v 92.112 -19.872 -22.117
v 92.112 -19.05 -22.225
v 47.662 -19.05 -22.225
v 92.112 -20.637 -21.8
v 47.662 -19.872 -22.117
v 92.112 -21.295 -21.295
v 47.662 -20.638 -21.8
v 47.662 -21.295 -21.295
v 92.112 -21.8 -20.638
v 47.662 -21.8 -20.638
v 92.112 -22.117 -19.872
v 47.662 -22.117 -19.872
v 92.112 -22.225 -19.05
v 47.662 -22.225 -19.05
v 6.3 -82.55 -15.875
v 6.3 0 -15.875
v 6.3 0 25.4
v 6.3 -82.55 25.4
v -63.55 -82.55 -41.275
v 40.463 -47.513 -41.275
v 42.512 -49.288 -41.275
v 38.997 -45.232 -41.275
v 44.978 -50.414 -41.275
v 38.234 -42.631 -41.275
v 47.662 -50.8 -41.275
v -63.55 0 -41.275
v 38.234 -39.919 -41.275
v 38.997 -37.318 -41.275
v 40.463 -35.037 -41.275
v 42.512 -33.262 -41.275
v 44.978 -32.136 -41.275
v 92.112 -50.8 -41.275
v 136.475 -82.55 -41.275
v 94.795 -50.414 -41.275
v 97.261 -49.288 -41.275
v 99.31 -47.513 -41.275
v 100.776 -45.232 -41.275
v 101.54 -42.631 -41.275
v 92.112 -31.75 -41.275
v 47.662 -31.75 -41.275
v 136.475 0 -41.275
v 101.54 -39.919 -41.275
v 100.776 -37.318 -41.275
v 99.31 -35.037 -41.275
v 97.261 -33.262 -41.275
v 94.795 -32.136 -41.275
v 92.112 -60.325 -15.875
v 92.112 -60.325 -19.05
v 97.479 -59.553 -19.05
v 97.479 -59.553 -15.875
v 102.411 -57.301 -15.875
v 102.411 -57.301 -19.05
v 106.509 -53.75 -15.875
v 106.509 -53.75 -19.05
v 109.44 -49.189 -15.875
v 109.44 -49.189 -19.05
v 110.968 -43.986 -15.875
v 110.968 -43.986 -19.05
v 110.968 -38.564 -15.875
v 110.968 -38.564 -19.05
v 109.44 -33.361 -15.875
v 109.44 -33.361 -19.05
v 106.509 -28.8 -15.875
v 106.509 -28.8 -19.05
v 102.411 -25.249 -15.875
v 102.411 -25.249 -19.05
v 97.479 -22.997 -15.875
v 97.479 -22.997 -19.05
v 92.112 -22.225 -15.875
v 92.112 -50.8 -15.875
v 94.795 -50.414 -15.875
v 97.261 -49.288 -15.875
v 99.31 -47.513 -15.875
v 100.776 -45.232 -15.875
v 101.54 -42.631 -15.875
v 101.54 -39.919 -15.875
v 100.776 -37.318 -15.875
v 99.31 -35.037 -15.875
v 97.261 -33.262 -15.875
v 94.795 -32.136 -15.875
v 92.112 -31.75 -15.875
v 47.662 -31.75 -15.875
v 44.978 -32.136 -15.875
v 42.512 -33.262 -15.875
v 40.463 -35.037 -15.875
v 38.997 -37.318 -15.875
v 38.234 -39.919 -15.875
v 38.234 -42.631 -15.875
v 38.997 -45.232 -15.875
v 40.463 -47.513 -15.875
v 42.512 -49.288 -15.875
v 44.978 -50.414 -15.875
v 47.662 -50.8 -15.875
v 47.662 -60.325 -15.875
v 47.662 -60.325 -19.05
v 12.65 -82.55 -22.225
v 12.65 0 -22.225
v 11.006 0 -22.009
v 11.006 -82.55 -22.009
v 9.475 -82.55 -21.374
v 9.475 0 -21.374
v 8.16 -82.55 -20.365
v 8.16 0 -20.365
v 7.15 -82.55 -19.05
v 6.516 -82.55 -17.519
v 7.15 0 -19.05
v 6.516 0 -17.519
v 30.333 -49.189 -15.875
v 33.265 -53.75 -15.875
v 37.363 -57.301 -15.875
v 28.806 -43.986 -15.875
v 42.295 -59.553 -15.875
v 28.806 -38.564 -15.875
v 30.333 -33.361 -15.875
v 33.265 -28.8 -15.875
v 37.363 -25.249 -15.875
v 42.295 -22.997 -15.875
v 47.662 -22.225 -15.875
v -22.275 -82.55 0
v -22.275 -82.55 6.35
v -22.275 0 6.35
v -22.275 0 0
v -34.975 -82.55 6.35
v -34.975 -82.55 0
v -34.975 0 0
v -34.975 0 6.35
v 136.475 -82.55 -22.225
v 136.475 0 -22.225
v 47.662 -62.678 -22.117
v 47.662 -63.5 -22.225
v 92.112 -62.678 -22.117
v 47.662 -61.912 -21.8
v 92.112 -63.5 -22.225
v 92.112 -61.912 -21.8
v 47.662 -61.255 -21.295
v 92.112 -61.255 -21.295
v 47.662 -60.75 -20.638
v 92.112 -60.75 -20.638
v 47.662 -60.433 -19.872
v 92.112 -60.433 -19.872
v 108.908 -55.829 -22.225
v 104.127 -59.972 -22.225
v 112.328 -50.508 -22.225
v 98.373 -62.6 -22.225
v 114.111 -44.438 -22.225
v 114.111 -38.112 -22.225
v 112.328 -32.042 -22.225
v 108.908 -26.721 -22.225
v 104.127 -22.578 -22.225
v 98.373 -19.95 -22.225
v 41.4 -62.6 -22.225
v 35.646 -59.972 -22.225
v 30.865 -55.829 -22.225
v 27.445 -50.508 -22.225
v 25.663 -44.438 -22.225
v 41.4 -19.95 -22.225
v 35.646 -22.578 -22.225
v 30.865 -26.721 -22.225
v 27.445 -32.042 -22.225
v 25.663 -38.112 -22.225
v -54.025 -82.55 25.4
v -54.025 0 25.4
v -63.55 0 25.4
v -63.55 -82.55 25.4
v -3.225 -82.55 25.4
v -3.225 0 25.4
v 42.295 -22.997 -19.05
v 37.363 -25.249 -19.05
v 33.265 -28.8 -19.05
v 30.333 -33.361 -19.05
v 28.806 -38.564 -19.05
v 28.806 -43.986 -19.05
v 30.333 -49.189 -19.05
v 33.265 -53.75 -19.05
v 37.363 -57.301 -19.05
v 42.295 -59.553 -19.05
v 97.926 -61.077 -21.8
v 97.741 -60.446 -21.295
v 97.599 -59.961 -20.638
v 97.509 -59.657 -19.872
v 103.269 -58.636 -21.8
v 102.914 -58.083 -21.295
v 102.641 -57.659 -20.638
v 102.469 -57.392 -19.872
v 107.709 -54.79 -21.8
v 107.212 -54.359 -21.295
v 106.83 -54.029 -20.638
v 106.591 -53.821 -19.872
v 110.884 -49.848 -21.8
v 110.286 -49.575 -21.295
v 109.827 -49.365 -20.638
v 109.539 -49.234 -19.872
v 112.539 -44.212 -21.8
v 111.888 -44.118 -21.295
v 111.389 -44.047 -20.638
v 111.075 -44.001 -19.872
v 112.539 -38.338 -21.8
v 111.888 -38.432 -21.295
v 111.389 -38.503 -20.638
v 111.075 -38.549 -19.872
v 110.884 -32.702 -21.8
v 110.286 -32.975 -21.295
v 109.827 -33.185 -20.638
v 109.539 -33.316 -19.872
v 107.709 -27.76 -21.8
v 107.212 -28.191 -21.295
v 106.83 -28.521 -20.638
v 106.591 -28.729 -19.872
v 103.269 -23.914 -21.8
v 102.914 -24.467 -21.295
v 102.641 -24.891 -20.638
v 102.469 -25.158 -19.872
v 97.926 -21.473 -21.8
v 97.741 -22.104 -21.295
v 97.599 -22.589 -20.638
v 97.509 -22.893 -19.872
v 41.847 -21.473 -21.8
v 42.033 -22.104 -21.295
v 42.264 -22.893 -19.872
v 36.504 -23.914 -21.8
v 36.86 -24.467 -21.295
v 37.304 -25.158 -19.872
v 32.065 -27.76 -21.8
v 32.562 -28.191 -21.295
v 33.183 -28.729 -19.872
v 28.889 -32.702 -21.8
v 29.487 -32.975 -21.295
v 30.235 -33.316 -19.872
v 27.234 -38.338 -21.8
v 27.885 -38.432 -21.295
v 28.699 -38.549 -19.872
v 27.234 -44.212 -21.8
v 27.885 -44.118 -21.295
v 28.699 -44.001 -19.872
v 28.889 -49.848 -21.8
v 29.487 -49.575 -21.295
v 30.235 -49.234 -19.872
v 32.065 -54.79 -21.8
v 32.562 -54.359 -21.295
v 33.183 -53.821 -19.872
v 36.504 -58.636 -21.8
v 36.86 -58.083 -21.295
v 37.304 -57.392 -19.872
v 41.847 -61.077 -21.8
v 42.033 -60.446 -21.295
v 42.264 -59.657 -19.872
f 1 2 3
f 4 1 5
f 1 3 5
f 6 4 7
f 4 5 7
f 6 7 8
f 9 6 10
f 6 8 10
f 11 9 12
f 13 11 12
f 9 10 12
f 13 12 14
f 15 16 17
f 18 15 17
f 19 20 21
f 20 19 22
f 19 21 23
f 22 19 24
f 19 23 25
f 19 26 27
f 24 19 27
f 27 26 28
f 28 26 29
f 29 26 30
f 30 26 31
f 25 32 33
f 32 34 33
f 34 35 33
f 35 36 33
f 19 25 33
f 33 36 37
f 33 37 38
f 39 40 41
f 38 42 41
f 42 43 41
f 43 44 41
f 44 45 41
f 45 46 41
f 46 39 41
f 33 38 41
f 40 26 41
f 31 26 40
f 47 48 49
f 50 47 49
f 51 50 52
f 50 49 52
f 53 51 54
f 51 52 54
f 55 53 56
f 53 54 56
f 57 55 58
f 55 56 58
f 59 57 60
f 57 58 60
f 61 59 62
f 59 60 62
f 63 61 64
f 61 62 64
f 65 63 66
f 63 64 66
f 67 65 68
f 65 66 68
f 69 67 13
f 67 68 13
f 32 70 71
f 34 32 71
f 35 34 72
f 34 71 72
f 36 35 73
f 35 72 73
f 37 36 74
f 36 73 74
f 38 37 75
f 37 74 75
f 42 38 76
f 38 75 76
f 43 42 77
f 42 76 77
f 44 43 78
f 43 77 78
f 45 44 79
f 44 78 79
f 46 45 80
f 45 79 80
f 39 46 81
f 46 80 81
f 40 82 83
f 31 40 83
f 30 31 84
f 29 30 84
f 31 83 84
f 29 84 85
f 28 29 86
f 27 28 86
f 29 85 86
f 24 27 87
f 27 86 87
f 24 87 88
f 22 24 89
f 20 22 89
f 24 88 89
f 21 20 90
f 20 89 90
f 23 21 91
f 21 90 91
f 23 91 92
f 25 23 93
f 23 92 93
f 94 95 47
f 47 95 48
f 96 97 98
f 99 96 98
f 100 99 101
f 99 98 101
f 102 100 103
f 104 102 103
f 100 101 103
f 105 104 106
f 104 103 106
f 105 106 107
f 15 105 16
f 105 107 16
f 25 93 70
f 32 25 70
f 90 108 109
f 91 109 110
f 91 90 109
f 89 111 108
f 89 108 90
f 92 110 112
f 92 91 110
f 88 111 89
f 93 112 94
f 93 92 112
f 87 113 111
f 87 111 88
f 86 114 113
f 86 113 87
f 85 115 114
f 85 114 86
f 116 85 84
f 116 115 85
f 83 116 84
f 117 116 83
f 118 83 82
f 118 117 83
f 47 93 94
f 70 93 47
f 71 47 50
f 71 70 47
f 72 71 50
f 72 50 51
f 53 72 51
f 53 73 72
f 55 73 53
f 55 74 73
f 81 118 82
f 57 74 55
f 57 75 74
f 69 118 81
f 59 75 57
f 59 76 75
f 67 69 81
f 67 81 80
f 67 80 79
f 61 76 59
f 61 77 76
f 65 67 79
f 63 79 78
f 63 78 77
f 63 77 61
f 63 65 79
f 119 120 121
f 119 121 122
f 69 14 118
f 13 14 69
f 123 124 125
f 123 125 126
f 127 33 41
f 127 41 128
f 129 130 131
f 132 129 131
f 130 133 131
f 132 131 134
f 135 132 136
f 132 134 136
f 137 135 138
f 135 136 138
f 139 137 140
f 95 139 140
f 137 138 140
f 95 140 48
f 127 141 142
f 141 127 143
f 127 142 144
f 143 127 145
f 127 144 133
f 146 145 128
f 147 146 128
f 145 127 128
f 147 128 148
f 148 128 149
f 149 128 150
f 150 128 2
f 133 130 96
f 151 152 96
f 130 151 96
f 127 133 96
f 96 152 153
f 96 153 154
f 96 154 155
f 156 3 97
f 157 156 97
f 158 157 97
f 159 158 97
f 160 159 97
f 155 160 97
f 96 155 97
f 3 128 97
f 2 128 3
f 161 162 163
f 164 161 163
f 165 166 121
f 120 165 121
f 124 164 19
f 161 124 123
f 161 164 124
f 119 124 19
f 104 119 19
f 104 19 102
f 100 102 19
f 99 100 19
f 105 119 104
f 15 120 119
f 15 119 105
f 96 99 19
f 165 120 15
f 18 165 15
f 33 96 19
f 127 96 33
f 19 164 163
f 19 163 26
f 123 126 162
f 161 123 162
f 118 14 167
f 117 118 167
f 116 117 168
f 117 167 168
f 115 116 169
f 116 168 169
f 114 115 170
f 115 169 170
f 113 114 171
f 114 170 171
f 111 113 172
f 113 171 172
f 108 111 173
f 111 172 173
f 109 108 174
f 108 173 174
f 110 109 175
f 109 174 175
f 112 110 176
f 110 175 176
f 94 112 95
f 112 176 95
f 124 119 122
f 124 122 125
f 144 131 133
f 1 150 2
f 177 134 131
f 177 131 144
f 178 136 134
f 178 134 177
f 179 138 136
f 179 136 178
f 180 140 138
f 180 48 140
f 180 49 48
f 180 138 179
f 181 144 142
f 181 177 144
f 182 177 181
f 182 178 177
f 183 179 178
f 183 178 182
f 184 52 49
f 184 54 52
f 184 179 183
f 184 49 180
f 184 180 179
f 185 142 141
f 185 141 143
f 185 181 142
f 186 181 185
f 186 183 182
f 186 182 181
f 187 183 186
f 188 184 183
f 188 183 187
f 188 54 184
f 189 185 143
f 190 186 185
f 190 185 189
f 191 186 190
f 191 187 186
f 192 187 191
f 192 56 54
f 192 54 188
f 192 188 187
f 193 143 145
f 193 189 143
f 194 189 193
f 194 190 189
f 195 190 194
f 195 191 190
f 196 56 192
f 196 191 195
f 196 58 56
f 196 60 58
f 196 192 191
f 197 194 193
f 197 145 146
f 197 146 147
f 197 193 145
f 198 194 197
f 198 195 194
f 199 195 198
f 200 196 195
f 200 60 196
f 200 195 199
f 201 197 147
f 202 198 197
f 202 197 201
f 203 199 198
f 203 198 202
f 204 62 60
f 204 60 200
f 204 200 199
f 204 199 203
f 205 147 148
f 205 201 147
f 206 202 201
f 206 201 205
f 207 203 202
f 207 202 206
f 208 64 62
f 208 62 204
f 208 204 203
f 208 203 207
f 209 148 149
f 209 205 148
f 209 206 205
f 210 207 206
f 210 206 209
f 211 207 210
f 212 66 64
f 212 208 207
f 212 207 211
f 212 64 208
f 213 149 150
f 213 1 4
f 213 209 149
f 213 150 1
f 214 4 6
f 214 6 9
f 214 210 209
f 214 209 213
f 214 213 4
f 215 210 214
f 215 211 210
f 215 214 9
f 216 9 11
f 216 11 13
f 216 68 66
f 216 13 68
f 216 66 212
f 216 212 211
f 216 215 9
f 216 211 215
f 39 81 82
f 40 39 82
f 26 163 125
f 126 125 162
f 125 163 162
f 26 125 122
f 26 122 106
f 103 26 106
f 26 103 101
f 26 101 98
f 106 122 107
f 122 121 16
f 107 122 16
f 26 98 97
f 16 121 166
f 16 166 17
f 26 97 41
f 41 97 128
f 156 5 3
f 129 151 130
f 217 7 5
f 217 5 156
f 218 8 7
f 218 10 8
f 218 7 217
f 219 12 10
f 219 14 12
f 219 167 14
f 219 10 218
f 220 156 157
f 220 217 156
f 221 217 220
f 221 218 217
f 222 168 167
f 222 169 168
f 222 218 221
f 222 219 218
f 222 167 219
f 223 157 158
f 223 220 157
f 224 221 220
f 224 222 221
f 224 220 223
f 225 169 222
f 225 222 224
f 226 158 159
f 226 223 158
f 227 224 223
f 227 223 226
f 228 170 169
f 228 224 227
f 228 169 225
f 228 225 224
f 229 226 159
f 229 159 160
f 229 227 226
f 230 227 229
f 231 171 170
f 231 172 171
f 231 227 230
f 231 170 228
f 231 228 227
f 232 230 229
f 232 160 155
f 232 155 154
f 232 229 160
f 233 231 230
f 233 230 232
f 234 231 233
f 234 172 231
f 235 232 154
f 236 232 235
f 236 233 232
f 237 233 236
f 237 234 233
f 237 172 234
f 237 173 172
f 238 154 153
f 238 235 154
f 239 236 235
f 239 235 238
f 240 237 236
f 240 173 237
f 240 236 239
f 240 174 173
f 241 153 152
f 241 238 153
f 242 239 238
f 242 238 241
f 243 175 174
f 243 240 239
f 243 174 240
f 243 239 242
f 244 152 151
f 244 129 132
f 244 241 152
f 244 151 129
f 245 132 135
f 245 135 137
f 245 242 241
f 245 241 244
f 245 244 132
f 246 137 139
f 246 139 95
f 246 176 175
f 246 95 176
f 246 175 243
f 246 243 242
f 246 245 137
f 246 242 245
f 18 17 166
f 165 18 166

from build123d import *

# Parameters (mm, degrees)
F1_DEPTH = 82.55
F2_W     = 44.45
F2_H     = 9.525
F3_DEPTH = 6.35
F4_DEPTH = 25.4
F5_R     = 3.175


with BuildPart() as f1:
    # F0 (on Front) → F1 (new body)
    with BuildSketch(Plane.XZ):
        with BuildLine():
            Line((-54.025357, 25.4), (-63.550357, 25.4))
            Line((-63.550357, 25.4), (-63.550357, -41.275))
            Line((-63.550357, -41.275), (136.474643, -41.275))
            Line((136.474643, -41.275), (136.474643, -22.225))
            Line((136.474643, -22.225), (12.649643, -22.225))
            ThreePointArc((12.649643, -22.225), (8.159515, -20.365128), (6.299643, -15.875))
            Line((6.299643, -15.875), (6.299643, 25.4))
            Line((6.299643, 25.4), (-3.225357, 25.4))
            Line((-3.225357, 25.4), (-22.275357, 6.35))
            Line((-22.275357, 6.35), (-22.275357, 0))
            Line((-22.275357, 0), (-34.975357, 0))
            Line((-34.975357, 0), (-34.975357, 6.35))
            Line((-34.975357, 6.35), (-54.025357, 25.4))
        make_face()
    extrude(amount=F1_DEPTH)

    # F2 (on face) → F3 (join)
    with BuildSketch(Plane.XY.offset(-22.225)):
        with BuildLine():
            Line((47.66174, -60.325), (47.66174, -50.8))
            ThreePointArc((47.66174, -50.8), (38.13674, -41.275), (47.66174, -31.75))
            Line((47.66174, -31.75), (47.66174, -22.225))
            ThreePointArc((47.66174, -22.225), (28.61174, -41.275), (47.66174, -60.325))
        make_face()
        with Locations((69.88674, -55.5625)):
            Rectangle(F2_W, F2_H)
        with BuildLine():
            ThreePointArc((92.11174, -31.75), (101.63674, -41.275), (92.11174, -50.8))
            Line((92.11174, -50.8), (92.11174, -60.325))
            ThreePointArc((92.11174, -60.325), (111.16174, -41.275), (92.11174, -22.225))
            Line((92.11174, -22.225), (92.11174, -31.75))
        make_face()
        with Locations((69.88674, -26.9875)):
            Rectangle(F2_W, F2_H)
    extrude(amount=F3_DEPTH)

    # F3_face (on face) → F4 (cut)
    with BuildSketch(Plane(origin=(69.88674, -41.275, -22.225), x_dir=(1, 0, 0), z_dir=(0, 0, 1))):
        with BuildLine():
            Line((-22.225, -9.525), (22.225, -9.525))
            ThreePointArc((22.225, -9.525), (31.75, 0), (22.225, 9.525))
            Line((22.225, 9.525), (-22.225, 9.525))
            ThreePointArc((-22.225, 9.525), (-31.75, 0), (-22.225, -9.525))
        make_face()
    extrude(amount=-F4_DEPTH, mode=Mode.SUBTRACT)

    # F5
    f5_edges = [f1.edges().sort_by_distance(p)[0] for p in [
        (69.88674, -60.325, -22.225),
    ]]
    fillet(f5_edges, radius=F5_R)


solid = f1.part
